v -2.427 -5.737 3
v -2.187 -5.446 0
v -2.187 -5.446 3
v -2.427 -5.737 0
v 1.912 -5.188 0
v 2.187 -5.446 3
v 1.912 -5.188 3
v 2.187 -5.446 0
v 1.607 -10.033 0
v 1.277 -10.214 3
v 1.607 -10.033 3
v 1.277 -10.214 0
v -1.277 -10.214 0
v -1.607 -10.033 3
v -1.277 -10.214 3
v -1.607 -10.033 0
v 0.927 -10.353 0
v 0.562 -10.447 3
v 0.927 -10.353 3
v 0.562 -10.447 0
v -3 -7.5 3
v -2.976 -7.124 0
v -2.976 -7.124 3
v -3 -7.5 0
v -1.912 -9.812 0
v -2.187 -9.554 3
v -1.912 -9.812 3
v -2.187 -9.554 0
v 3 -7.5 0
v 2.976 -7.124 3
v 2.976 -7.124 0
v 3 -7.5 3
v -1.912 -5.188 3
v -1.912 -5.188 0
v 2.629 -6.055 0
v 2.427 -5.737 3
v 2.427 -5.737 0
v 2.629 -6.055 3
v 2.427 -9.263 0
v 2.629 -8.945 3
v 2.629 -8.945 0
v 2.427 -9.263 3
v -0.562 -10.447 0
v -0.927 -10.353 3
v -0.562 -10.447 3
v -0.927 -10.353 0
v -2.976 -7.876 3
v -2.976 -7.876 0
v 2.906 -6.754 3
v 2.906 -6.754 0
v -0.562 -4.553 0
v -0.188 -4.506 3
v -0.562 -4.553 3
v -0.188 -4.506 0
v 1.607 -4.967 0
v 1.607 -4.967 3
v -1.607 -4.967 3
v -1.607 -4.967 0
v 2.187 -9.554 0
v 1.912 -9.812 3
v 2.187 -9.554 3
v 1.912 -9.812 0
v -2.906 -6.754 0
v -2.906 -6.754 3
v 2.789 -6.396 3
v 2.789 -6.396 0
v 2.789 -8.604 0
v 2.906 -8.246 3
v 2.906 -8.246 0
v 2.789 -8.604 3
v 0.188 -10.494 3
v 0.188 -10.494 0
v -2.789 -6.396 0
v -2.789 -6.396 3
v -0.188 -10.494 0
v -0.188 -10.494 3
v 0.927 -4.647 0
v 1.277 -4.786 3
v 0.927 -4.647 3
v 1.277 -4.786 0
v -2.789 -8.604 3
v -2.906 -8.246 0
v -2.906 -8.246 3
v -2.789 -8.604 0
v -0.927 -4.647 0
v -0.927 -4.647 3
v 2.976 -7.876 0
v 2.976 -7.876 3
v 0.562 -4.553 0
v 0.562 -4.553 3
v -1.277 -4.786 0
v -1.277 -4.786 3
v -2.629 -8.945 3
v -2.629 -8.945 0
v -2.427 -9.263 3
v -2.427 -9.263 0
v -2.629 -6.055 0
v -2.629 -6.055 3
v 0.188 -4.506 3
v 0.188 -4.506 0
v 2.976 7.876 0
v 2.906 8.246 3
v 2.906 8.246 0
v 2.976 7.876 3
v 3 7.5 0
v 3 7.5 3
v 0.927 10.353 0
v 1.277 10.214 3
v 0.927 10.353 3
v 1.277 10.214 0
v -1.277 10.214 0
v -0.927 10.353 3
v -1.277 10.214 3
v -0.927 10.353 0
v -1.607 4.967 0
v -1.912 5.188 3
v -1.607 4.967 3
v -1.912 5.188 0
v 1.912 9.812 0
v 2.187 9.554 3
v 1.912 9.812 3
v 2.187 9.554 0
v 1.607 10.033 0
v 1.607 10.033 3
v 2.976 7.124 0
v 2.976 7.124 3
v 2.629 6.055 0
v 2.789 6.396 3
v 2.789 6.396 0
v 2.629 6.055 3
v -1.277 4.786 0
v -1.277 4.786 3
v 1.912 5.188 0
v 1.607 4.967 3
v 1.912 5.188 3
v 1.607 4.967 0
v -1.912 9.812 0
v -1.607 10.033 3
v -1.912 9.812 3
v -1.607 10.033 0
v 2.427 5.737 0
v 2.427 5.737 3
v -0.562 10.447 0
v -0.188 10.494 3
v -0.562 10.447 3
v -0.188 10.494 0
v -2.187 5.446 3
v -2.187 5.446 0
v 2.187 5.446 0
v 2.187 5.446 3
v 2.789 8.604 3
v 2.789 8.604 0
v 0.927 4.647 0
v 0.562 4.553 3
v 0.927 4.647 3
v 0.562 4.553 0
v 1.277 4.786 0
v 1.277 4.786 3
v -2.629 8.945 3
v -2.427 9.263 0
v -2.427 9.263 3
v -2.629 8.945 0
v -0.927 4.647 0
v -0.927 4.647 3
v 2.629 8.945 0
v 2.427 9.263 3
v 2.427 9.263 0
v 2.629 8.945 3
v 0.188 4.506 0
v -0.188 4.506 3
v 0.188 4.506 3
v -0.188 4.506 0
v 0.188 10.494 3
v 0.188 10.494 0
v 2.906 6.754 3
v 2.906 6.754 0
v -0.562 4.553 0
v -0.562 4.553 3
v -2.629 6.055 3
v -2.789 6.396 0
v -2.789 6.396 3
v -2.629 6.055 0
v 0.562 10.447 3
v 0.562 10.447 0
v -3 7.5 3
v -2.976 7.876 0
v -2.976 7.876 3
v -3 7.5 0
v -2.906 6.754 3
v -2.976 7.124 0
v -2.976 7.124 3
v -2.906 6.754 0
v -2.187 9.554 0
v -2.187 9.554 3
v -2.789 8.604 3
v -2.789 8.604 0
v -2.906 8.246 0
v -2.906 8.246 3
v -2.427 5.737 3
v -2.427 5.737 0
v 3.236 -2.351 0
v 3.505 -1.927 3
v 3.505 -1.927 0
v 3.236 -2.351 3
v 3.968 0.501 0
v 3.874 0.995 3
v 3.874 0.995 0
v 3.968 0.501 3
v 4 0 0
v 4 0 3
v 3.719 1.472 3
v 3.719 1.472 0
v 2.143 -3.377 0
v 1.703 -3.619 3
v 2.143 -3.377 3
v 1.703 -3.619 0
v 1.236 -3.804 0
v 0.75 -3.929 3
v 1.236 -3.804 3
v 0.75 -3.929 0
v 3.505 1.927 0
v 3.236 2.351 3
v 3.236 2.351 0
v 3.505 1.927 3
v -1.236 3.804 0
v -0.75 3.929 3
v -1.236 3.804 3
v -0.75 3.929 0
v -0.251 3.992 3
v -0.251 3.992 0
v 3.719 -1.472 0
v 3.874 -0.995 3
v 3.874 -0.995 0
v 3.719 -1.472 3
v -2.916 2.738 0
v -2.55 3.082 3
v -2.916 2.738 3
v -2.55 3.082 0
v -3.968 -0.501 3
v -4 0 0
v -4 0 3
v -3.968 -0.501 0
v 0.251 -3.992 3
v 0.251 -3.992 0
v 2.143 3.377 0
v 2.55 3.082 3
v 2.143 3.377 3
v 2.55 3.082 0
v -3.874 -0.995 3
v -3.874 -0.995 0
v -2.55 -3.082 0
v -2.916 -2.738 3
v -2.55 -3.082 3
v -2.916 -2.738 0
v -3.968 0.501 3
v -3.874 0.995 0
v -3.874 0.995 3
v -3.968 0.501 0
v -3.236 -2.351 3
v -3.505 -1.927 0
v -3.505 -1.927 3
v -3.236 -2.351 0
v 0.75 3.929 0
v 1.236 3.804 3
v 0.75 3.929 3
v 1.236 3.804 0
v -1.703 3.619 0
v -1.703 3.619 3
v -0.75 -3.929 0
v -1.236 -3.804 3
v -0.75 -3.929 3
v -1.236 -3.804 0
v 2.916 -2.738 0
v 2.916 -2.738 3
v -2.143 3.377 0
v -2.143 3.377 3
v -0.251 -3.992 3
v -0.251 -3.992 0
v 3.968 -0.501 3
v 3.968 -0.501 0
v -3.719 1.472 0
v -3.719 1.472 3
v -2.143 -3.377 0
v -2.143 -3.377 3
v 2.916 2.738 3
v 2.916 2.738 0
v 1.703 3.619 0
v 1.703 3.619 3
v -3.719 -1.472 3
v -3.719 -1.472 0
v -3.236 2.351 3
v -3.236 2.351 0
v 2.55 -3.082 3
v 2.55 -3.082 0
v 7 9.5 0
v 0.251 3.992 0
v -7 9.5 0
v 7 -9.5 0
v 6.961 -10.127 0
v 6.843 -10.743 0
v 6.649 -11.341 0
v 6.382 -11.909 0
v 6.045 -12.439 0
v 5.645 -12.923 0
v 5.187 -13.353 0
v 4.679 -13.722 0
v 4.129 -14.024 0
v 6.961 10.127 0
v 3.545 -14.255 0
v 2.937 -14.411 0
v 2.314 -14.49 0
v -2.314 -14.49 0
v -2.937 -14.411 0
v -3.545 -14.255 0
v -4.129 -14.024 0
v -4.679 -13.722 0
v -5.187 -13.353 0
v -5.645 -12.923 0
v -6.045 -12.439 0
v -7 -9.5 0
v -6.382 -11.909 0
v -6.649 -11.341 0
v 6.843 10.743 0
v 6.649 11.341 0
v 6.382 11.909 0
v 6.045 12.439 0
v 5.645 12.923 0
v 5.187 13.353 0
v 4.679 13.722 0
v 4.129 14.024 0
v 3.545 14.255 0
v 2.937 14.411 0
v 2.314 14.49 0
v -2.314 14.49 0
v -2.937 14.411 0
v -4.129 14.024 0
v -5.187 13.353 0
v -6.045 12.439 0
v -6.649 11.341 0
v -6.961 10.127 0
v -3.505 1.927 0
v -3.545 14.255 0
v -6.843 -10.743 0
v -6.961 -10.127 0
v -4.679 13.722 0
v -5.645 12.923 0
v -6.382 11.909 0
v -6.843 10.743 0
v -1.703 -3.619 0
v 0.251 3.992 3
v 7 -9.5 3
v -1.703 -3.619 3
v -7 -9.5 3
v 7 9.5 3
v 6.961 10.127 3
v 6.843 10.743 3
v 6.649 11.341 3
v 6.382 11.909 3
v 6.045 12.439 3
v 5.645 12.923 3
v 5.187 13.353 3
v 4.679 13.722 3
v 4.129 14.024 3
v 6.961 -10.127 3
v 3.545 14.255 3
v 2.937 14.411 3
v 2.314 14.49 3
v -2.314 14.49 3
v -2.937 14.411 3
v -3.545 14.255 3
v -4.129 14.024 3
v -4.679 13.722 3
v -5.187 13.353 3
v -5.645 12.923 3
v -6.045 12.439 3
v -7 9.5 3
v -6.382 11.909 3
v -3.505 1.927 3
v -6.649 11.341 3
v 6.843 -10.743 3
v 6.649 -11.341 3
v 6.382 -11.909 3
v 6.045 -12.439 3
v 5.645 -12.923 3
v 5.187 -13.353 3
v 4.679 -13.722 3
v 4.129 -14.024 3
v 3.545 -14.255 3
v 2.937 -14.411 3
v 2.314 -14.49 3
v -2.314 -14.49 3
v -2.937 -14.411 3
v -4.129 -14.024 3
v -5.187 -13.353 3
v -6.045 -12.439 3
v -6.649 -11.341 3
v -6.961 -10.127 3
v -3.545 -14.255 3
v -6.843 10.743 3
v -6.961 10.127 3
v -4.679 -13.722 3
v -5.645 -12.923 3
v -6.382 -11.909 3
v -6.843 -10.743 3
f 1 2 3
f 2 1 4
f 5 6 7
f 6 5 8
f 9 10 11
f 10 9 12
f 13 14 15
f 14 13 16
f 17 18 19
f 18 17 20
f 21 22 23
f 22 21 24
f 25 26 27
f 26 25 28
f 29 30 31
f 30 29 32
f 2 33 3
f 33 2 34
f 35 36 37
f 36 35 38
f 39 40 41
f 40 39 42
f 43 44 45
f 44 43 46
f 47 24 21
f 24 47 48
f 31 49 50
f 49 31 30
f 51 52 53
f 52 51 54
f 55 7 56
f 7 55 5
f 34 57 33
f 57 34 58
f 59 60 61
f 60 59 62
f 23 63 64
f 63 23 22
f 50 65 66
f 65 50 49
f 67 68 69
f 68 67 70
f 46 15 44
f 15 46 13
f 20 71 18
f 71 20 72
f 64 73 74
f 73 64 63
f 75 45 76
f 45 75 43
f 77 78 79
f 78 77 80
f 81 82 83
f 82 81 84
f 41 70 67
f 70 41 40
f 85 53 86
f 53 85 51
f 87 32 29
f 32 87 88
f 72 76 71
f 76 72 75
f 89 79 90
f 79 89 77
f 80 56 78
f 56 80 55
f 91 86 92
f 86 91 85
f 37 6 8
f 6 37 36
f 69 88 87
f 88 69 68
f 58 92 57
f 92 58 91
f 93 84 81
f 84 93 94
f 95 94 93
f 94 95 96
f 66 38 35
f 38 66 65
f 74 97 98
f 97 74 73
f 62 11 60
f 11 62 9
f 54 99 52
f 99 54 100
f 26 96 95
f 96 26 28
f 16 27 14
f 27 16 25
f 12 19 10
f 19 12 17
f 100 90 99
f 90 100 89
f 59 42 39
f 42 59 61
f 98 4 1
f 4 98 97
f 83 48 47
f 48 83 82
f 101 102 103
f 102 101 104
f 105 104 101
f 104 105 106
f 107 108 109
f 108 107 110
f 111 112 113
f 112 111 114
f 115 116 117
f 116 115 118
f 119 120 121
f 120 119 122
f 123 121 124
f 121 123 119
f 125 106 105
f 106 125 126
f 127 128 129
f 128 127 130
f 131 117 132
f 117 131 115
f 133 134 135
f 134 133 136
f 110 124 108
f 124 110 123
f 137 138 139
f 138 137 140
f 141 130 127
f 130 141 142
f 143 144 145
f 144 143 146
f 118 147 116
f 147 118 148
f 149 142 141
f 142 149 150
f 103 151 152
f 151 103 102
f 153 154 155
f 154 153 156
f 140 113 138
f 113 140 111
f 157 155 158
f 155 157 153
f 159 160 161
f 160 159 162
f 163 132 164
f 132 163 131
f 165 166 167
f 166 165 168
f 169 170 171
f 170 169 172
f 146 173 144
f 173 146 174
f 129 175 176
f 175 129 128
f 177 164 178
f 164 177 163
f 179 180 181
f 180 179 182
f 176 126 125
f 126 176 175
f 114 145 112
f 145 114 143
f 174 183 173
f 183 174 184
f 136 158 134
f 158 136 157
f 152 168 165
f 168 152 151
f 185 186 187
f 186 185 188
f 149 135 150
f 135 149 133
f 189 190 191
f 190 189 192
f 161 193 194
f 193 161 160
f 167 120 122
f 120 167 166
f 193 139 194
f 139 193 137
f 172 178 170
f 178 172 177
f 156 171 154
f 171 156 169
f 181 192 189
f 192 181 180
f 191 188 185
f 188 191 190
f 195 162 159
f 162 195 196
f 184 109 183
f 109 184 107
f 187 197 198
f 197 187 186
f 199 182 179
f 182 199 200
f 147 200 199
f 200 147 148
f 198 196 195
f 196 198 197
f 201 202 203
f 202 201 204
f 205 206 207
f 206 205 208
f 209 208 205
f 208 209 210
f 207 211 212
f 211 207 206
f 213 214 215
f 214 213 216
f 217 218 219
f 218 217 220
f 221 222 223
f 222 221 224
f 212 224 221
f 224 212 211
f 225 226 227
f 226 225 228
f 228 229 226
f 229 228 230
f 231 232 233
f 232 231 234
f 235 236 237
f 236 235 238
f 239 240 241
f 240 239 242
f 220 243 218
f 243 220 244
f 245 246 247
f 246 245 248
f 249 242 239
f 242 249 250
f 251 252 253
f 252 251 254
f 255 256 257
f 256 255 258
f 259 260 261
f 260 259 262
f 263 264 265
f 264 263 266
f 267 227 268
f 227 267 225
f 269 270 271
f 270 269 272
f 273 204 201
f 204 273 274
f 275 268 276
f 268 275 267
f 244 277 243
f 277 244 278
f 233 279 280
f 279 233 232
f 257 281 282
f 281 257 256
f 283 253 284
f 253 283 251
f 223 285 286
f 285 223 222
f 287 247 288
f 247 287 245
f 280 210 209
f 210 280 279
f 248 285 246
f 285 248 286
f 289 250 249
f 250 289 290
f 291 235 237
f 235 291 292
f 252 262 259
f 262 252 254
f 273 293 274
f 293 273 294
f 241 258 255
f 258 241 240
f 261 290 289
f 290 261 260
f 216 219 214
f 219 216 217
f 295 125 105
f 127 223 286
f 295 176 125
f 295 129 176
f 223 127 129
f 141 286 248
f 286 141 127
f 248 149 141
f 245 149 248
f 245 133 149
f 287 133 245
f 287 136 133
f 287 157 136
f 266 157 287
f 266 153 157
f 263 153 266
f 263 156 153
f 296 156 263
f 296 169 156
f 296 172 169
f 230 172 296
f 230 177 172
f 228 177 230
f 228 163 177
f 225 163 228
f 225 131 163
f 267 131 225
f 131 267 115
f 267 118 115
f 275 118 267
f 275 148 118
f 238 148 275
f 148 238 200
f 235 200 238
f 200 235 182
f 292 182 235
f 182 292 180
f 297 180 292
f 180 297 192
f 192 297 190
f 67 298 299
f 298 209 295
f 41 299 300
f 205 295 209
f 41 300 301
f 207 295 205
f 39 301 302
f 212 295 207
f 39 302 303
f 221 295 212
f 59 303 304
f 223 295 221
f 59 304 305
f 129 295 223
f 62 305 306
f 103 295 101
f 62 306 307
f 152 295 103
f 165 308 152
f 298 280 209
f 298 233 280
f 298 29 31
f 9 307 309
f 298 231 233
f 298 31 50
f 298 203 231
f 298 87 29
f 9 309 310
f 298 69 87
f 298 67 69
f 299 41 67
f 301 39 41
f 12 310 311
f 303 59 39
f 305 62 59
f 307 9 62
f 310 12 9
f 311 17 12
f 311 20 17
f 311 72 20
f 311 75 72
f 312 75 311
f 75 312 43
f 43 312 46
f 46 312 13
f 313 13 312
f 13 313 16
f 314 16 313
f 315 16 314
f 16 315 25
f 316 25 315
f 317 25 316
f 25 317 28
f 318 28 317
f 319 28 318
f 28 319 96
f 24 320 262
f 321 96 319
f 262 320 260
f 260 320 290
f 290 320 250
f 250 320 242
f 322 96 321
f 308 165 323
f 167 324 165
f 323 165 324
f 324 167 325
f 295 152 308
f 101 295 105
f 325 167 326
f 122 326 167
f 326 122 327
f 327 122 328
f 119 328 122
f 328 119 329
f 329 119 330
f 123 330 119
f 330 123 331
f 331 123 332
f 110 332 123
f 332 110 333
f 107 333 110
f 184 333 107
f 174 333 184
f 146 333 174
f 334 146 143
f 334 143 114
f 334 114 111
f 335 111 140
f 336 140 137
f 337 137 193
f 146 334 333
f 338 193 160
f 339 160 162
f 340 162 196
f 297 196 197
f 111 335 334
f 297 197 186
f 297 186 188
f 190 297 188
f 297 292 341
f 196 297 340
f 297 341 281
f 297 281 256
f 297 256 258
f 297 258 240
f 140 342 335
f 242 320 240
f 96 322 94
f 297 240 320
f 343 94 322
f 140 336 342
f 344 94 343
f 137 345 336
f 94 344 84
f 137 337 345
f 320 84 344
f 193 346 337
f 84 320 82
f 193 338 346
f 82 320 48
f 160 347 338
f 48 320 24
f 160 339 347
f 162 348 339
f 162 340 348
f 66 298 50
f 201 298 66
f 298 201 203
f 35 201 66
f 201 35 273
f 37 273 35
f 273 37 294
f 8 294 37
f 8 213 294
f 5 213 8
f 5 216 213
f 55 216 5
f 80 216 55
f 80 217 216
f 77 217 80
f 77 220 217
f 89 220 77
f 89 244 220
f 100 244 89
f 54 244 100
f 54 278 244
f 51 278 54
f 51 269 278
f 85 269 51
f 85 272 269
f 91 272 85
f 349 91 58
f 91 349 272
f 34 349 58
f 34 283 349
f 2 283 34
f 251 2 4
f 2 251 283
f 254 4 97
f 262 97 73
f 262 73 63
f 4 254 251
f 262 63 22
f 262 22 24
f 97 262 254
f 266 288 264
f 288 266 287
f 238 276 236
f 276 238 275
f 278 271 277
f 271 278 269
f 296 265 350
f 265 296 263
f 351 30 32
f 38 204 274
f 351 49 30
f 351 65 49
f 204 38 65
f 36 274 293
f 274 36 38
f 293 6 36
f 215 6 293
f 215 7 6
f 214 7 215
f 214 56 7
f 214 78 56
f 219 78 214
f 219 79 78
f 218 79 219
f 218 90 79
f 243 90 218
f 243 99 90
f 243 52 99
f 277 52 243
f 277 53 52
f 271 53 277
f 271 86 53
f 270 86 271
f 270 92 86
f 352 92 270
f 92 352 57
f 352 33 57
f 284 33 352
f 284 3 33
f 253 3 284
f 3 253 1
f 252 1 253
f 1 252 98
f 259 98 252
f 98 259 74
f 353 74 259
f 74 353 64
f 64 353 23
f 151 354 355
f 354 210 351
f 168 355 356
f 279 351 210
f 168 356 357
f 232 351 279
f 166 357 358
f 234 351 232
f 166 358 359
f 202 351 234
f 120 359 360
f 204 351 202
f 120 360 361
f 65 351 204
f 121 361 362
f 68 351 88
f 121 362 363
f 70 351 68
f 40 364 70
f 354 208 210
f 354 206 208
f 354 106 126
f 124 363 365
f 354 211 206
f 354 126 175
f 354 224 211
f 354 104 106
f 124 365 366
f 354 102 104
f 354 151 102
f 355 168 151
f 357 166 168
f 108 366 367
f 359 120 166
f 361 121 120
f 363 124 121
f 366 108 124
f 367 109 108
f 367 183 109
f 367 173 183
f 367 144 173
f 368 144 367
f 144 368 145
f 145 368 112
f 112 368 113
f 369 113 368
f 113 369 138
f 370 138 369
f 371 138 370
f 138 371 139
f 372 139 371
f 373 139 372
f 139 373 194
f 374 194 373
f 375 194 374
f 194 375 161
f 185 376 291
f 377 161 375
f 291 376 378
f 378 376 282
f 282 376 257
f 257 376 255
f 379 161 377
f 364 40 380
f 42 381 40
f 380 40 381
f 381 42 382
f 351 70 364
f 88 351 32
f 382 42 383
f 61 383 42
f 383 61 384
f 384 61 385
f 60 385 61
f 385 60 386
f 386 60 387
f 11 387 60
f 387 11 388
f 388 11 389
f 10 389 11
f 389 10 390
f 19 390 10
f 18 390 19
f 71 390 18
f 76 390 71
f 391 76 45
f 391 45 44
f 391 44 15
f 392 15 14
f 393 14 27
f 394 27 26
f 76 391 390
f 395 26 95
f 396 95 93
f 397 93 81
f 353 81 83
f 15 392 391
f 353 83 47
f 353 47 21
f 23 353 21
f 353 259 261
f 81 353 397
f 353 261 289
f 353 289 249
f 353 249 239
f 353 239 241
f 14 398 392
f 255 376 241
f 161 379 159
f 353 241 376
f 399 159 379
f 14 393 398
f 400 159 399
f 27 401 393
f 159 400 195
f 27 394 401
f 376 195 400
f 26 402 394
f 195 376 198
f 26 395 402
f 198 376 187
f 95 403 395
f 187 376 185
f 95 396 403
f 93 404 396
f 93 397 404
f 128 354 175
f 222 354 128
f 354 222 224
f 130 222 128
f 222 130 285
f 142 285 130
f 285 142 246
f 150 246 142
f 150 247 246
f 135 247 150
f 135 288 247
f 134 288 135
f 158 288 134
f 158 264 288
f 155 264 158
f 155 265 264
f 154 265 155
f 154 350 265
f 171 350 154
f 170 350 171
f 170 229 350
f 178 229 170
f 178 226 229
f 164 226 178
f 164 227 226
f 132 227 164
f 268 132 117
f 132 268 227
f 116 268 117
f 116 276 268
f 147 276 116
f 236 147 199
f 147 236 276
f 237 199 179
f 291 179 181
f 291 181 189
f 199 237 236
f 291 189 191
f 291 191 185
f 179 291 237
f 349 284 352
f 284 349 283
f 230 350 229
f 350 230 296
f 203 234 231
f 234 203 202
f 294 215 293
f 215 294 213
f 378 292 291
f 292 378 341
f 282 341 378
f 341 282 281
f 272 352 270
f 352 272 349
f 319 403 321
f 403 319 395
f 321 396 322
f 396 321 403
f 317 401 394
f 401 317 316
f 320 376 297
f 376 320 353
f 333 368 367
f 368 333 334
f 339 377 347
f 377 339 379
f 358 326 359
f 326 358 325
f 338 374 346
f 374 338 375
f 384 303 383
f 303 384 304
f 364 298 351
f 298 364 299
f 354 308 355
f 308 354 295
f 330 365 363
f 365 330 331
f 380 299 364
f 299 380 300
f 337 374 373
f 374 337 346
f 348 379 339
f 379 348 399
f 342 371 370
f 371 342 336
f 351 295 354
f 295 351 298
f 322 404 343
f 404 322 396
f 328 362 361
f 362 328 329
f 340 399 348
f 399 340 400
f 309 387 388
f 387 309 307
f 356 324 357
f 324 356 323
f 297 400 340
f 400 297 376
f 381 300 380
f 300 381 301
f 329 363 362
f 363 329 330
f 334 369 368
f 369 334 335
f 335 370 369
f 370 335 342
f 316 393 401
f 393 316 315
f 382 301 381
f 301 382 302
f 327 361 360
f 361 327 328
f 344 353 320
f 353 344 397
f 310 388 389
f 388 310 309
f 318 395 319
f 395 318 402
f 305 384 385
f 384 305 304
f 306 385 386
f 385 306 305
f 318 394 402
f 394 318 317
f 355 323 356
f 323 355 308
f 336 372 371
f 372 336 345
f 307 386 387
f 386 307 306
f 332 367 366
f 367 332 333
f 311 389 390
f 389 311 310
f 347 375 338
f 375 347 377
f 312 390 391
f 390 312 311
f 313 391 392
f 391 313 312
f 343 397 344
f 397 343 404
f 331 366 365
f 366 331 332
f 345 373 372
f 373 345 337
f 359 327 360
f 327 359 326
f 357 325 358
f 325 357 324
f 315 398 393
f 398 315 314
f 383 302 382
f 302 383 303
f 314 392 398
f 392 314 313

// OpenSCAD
$fn = 50;


difference() {
	union() {
		hull() {
			translate(v = [-2.0000000000, 9.5000000000, 0]) {
				cylinder(h = 3, r = 5);
			}
			translate(v = [2.0000000000, 9.5000000000, 0]) {
				cylinder(h = 3, r = 5);
			}
			translate(v = [-2.0000000000, -9.5000000000, 0]) {
				cylinder(h = 3, r = 5);
			}
			translate(v = [2.0000000000, -9.5000000000, 0]) {
				cylinder(h = 3, r = 5);
			}
		}
	}
	union() {
		#translate(v = [0.0000000000, -7.5000000000, -100.0000000000]) {
			cylinder(h = 200, r = 3.0000000000);
		}
		#translate(v = [0.0000000000, -7.5000000000, -100.0000000000]) {
			cylinder(h = 200, r = 3.0000000000);
		}
		#translate(v = [0.0000000000, 7.5000000000, -100.0000000000]) {
			cylinder(h = 200, r = 3.0000000000);
		}
		#translate(v = [0.0000000000, 7.5000000000, -100.0000000000]) {
			cylinder(h = 200, r = 3.0000000000);
		}
		#cylinder(h = 3, r = 4.0000000000);
	}
}
